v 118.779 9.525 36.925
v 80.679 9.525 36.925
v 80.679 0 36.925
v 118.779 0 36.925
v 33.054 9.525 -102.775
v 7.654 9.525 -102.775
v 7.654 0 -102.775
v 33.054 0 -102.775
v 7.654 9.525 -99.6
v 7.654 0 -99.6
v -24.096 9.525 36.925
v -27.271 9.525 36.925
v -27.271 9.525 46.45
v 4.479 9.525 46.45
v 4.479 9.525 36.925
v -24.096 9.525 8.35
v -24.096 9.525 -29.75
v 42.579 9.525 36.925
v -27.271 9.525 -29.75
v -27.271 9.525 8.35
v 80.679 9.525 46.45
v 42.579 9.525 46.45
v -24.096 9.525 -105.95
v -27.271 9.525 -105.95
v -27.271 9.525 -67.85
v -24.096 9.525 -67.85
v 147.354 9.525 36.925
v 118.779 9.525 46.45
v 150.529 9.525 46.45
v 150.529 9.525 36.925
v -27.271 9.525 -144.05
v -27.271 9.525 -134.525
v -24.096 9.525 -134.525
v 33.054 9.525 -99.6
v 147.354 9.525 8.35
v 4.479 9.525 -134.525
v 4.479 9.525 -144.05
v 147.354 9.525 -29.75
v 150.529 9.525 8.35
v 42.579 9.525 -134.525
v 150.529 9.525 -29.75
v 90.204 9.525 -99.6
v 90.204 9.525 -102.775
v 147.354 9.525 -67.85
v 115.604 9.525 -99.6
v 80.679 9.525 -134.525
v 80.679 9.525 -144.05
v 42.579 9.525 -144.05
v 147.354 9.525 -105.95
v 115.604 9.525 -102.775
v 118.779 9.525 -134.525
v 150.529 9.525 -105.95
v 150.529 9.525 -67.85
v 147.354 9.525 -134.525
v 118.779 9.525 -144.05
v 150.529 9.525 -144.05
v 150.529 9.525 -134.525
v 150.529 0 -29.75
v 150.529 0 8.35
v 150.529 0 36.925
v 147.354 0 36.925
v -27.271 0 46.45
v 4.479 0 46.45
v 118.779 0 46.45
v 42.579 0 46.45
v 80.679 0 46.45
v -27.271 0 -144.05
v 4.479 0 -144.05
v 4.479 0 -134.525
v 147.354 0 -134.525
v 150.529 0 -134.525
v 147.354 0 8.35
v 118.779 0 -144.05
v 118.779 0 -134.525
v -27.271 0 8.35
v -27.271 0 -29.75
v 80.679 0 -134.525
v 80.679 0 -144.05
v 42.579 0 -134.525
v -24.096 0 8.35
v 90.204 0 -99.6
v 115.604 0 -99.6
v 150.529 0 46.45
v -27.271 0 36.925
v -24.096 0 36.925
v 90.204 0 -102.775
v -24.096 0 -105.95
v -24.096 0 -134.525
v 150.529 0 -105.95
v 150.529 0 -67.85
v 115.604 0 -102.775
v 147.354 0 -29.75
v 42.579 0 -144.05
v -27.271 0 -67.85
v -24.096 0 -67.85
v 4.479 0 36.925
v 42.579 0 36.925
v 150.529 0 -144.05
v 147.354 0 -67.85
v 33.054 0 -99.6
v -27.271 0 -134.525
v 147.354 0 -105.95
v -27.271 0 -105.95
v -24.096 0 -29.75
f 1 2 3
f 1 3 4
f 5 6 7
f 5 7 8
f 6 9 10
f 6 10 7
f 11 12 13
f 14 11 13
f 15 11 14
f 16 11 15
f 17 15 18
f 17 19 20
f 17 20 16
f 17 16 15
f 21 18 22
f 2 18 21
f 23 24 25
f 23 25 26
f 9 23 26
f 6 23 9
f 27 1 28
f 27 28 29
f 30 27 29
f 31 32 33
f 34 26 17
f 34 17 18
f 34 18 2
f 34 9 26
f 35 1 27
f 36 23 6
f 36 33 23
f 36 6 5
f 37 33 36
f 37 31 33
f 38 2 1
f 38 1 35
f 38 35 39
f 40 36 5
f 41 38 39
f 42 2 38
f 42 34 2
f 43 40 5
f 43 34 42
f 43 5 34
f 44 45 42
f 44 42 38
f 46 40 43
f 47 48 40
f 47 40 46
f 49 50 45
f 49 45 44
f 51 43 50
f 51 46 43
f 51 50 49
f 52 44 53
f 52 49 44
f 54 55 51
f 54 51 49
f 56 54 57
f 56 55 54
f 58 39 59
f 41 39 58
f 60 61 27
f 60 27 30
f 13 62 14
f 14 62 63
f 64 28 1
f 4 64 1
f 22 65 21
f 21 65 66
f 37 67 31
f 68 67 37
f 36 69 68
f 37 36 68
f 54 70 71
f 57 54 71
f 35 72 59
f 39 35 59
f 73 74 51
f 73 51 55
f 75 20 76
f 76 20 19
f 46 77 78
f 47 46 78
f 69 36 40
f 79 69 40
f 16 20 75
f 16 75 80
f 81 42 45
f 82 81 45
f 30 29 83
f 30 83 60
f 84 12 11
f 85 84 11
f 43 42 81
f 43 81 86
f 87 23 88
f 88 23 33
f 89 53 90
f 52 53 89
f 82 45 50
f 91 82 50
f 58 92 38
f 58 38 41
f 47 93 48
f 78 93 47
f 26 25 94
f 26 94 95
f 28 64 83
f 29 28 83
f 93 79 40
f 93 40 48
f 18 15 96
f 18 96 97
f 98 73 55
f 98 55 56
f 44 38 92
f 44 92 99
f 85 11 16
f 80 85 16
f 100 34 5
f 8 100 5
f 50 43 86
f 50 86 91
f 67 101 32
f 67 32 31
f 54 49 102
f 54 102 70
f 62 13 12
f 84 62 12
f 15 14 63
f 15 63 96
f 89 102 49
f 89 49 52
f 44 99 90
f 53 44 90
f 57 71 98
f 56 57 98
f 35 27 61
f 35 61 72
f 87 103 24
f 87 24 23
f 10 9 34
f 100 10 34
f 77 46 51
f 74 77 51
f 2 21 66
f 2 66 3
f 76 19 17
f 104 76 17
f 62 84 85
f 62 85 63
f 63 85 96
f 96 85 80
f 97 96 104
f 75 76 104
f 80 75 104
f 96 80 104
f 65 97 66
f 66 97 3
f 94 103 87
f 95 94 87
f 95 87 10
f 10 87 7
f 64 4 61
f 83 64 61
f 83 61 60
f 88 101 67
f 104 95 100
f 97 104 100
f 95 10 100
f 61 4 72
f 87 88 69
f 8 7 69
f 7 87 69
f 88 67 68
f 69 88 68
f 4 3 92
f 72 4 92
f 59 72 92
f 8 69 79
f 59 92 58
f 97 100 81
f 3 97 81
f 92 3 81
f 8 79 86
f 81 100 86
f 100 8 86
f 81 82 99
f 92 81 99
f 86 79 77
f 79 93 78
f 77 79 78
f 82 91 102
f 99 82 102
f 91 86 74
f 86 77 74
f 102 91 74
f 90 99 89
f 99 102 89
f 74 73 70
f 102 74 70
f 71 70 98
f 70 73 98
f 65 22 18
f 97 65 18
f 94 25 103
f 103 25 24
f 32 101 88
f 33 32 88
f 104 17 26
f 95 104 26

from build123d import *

# Parameters (mm, degrees)
SKETCH1_W           = 190.5
SKETCH1_H           = 190.5
BOSS_EXTRUDE1_DEPTH = 9.525
SKETCH2_W           = 38.1
SKETCH2_H           = 9.525
CUT_EXTRUDE1_DEPTH  = 9.525
SKETCH3_W           = 38.1
SKETCH3_H           = 9.525
CUT_EXTRUDE2_DEPTH  = 9.525
SKETCH4_W           = 9.525
SKETCH4_H           = 28.575
CUT_EXTRUDE3_DEPTH  = 9.525
SKETCH5_W           = 9.525
SKETCH5_H           = 38.1
CUT_EXTRUDE4_DEPTH  = 9.525
SKETCH6_W           = 9.525
SKETCH6_H           = 28.575
CUT_EXTRUDE5_DEPTH  = 9.525
SKETCH7_W           = 38.1
SKETCH7_H           = 9.525
CUT_EXTRUDE6_DEPTH  = 9.525
SKETCH8_W           = 38.1
SKETCH8_H           = 9.525
CUT_EXTRUDE7_DEPTH  = 9.525
SKETCH9_W           = 9.525
SKETCH9_H           = 28.575
CUT_EXTRUDE8_DEPTH  = 38.1
SKETCH10_W          = 9.525
SKETCH10_H          = 38.1
CUT_EXTRUDE9_DEPTH  = 9.525
SKETCH11_W          = 9.525
SKETCH11_H          = 28.575
CUT_EXTRUDE10_DEPTH = 9.525
SKETCH12_W          = 25.4
SKETCH12_H          = 3.175
CUT_EXTRUDE11_DEPTH = 12.7
SKETCH15_W          = 6.35
SKETCH15_H          = 9.525
CUT_EXTRUDE14_DEPTH = 214.194785552
SKETCH19_W          = 6.35
SKETCH19_H          = 38.1
SKETCH19_H_2        = 9.525
CUT_EXTRUDE16_DEPTH = 214.194785552
SKETCH16_W          = 6.35
SKETCH16_H          = 38.1
SKETCH16_H_2        = 9.525
CUT_EXTRUDE15_DEPTH = 209.566482942


with BuildPart() as part:
    # Sketch1 → Boss-Extrude1 (new body)
    with BuildSketch(Plane(origin=(0, 0, 0), x_dir=(1, 0, 0), z_dir=(0, 1, 0))):
        with Locations((61.628840928, 48.799714441)):
            Rectangle(SKETCH1_W, SKETCH1_H)
    extrude(amount=BOSS_EXTRUDE1_DEPTH)

    # Sketch2 → Cut-Extrude1 (cut)
    with BuildSketch(Plane(origin=(0, 9.525, 0), x_dir=(1, 0, 0), z_dir=(0, 1, 0))):
        with Locations((99.728840928, -41.687785559)):
            Rectangle(SKETCH2_W, SKETCH2_H)
    extrude(amount=-CUT_EXTRUDE1_DEPTH, mode=Mode.SUBTRACT)

    # Sketch3 → Cut-Extrude2 (cut)
    with BuildSketch(Plane(origin=(0, 9.525, 0), x_dir=(1, 0, 0), z_dir=(0, 1, 0))):
        with Locations((23.528840928, -41.687785559)):
            Rectangle(SKETCH3_W, SKETCH3_H)
    extrude(amount=-CUT_EXTRUDE2_DEPTH, mode=Mode.SUBTRACT)

    # Sketch4 → Cut-Extrude3 (cut)
    with BuildSketch(Plane(origin=(0, 9.525, 0), x_dir=(1, 0, 0), z_dir=(0, 1, 0))):
        with Locations((152.116340928, -22.637785559)):
            Rectangle(SKETCH4_W, SKETCH4_H)
    extrude(amount=-CUT_EXTRUDE3_DEPTH, mode=Mode.SUBTRACT)

    # Sketch5 → Cut-Extrude4 (cut)
    with BuildSketch(Plane(origin=(0, 9.525, 0), x_dir=(1, 0, 0), z_dir=(0, 1, 0))):
        with Locations((152.116340928, 48.799714441)):
            Rectangle(SKETCH5_W, SKETCH5_H)
    extrude(amount=-CUT_EXTRUDE4_DEPTH, mode=Mode.SUBTRACT)

    # Sketch6 → Cut-Extrude5 (cut)
    with BuildSketch(Plane(origin=(0, 9.525, 0), x_dir=(1, 0, 0), z_dir=(0, 1, 0))):
        with Locations((152.116340928, 120.237214441)):
            Rectangle(SKETCH6_W, SKETCH6_H)
    extrude(amount=-CUT_EXTRUDE5_DEPTH, mode=Mode.SUBTRACT)

    # Sketch7 → Cut-Extrude6 (cut)
    with BuildSketch(Plane(origin=(0, 9.525, 0), x_dir=(1, 0, 0), z_dir=(0, 1, 0))):
        with Locations((99.728840928, 139.287214441)):
            Rectangle(SKETCH7_W, SKETCH7_H)
    extrude(amount=-CUT_EXTRUDE6_DEPTH, mode=Mode.SUBTRACT)

    # Sketch8 → Cut-Extrude7 (cut)
    with BuildSketch(Plane(origin=(0, 9.525, 0), x_dir=(1, 0, 0), z_dir=(0, 1, 0))):
        with Locations((23.528840928, 139.287214441)):
            Rectangle(SKETCH8_W, SKETCH8_H)
    extrude(amount=-CUT_EXTRUDE7_DEPTH, mode=Mode.SUBTRACT)

    # Sketch9 → Cut-Extrude8 (cut)
    with BuildSketch(Plane(origin=(0, 9.525, 0), x_dir=(1, 0, 0), z_dir=(0, 1, 0))):
        with Locations((-28.858659072, 120.237214441)):
            Rectangle(SKETCH9_W, SKETCH9_H)
    extrude(amount=-CUT_EXTRUDE8_DEPTH, mode=Mode.SUBTRACT)

    # Sketch10 → Cut-Extrude9 (cut)
    with BuildSketch(Plane(origin=(0, 9.525, 0), x_dir=(1, 0, 0), z_dir=(0, 1, 0))):
        with Locations((-28.858659072, 48.799714441)):
            Rectangle(SKETCH10_W, SKETCH10_H)
    extrude(amount=-CUT_EXTRUDE9_DEPTH, mode=Mode.SUBTRACT)

    # Sketch11 → Cut-Extrude10 (cut)
    with BuildSketch(Plane(origin=(0, 9.525, 0), x_dir=(1, 0, 0), z_dir=(0, 1, 0))):
        with Locations((-28.858659072, -22.637785559)):
            Rectangle(SKETCH11_W, SKETCH11_H)
    extrude(amount=-CUT_EXTRUDE10_DEPTH, mode=Mode.SUBTRACT)

    # Sketch12 → Cut-Extrude11 (cut)
    with BuildSketch(Plane(origin=(0, 9.525, 0), x_dir=(1, 0, 0), z_dir=(0, 1, 0))):
        with Locations((20.353840928, 101.187214441)):
            Rectangle(SKETCH12_W, SKETCH12_H)
        with Locations((102.903840928, 101.187214441)):
            Rectangle(SKETCH12_W, SKETCH12_H)
    extrude(amount=-CUT_EXTRUDE11_DEPTH, mode=Mode.SUBTRACT)

    # Sketch15 → Cut-Extrude14 (cut, through all)
    with BuildSketch(Plane(origin=(0, 9.525, 0), x_dir=(1, 0, 0), z_dir=(0, 1, 0))):
        with Locations((-30.446159072, 139.287214441)):
            Rectangle(SKETCH15_W, SKETCH15_H)
    extrude(amount=-CUT_EXTRUDE14_DEPTH, mode=Mode.SUBTRACT)

    # Sketch19 → Cut-Extrude16 (cut, through all)
    with BuildSketch(Plane(origin=(0, 9.525, 0), x_dir=(1, 0, 0), z_dir=(0, 1, 0))):
        with Locations((-30.446159072, 86.899714441)):
            Rectangle(SKETCH19_W, SKETCH19_H)
        with Locations((-30.446159072, 10.699714441)):
            Rectangle(SKETCH19_W, SKETCH19_H)
        with Locations((-30.446159072, -41.687785559)):
            Rectangle(SKETCH19_W, SKETCH19_H_2)
        with Locations((153.703840928, -41.687785559)):
            Rectangle(SKETCH19_W, SKETCH19_H_2)
        with Locations((153.703840928, 10.699714441)):
            Rectangle(SKETCH19_W, SKETCH19_H)
        with Locations((153.703840928, 86.899714441)):
            Rectangle(SKETCH19_W, SKETCH19_H)
        with Locations((153.703840928, 139.287214441)):
            Rectangle(SKETCH19_W, SKETCH19_H_2)
    extrude(amount=-CUT_EXTRUDE16_DEPTH, mode=Mode.SUBTRACT)

    # Sketch16 → Cut-Extrude15 (cut, through all)
    with BuildSketch(Plane(origin=(0, 9.525, 0), x_dir=(1, 0, 0), z_dir=(0, 1, 0))):
        with Locations((-30.446159072, 86.899714441)):
            Rectangle(SKETCH16_W, SKETCH16_H)
        with Locations((-30.446159072, 10.699714441)):
            Rectangle(SKETCH16_W, SKETCH16_H)
        with Locations((-30.446159072, -41.687785559)):
            Rectangle(SKETCH16_W, SKETCH16_H_2)
        with Locations((153.703840928, -41.687785559)):
            Rectangle(SKETCH16_W, SKETCH16_H_2)
        with Locations((153.703840928, 10.699714441)):
            Rectangle(SKETCH16_W, SKETCH16_H)
        with Locations((153.703840928, 86.899714441)):
            Rectangle(SKETCH16_W, SKETCH16_H)
        with Locations((153.703840928, 139.287214441)):
            Rectangle(SKETCH16_W, SKETCH16_H_2)
    extrude(amount=-CUT_EXTRUDE15_DEPTH, mode=Mode.SUBTRACT)


solid = part.part
